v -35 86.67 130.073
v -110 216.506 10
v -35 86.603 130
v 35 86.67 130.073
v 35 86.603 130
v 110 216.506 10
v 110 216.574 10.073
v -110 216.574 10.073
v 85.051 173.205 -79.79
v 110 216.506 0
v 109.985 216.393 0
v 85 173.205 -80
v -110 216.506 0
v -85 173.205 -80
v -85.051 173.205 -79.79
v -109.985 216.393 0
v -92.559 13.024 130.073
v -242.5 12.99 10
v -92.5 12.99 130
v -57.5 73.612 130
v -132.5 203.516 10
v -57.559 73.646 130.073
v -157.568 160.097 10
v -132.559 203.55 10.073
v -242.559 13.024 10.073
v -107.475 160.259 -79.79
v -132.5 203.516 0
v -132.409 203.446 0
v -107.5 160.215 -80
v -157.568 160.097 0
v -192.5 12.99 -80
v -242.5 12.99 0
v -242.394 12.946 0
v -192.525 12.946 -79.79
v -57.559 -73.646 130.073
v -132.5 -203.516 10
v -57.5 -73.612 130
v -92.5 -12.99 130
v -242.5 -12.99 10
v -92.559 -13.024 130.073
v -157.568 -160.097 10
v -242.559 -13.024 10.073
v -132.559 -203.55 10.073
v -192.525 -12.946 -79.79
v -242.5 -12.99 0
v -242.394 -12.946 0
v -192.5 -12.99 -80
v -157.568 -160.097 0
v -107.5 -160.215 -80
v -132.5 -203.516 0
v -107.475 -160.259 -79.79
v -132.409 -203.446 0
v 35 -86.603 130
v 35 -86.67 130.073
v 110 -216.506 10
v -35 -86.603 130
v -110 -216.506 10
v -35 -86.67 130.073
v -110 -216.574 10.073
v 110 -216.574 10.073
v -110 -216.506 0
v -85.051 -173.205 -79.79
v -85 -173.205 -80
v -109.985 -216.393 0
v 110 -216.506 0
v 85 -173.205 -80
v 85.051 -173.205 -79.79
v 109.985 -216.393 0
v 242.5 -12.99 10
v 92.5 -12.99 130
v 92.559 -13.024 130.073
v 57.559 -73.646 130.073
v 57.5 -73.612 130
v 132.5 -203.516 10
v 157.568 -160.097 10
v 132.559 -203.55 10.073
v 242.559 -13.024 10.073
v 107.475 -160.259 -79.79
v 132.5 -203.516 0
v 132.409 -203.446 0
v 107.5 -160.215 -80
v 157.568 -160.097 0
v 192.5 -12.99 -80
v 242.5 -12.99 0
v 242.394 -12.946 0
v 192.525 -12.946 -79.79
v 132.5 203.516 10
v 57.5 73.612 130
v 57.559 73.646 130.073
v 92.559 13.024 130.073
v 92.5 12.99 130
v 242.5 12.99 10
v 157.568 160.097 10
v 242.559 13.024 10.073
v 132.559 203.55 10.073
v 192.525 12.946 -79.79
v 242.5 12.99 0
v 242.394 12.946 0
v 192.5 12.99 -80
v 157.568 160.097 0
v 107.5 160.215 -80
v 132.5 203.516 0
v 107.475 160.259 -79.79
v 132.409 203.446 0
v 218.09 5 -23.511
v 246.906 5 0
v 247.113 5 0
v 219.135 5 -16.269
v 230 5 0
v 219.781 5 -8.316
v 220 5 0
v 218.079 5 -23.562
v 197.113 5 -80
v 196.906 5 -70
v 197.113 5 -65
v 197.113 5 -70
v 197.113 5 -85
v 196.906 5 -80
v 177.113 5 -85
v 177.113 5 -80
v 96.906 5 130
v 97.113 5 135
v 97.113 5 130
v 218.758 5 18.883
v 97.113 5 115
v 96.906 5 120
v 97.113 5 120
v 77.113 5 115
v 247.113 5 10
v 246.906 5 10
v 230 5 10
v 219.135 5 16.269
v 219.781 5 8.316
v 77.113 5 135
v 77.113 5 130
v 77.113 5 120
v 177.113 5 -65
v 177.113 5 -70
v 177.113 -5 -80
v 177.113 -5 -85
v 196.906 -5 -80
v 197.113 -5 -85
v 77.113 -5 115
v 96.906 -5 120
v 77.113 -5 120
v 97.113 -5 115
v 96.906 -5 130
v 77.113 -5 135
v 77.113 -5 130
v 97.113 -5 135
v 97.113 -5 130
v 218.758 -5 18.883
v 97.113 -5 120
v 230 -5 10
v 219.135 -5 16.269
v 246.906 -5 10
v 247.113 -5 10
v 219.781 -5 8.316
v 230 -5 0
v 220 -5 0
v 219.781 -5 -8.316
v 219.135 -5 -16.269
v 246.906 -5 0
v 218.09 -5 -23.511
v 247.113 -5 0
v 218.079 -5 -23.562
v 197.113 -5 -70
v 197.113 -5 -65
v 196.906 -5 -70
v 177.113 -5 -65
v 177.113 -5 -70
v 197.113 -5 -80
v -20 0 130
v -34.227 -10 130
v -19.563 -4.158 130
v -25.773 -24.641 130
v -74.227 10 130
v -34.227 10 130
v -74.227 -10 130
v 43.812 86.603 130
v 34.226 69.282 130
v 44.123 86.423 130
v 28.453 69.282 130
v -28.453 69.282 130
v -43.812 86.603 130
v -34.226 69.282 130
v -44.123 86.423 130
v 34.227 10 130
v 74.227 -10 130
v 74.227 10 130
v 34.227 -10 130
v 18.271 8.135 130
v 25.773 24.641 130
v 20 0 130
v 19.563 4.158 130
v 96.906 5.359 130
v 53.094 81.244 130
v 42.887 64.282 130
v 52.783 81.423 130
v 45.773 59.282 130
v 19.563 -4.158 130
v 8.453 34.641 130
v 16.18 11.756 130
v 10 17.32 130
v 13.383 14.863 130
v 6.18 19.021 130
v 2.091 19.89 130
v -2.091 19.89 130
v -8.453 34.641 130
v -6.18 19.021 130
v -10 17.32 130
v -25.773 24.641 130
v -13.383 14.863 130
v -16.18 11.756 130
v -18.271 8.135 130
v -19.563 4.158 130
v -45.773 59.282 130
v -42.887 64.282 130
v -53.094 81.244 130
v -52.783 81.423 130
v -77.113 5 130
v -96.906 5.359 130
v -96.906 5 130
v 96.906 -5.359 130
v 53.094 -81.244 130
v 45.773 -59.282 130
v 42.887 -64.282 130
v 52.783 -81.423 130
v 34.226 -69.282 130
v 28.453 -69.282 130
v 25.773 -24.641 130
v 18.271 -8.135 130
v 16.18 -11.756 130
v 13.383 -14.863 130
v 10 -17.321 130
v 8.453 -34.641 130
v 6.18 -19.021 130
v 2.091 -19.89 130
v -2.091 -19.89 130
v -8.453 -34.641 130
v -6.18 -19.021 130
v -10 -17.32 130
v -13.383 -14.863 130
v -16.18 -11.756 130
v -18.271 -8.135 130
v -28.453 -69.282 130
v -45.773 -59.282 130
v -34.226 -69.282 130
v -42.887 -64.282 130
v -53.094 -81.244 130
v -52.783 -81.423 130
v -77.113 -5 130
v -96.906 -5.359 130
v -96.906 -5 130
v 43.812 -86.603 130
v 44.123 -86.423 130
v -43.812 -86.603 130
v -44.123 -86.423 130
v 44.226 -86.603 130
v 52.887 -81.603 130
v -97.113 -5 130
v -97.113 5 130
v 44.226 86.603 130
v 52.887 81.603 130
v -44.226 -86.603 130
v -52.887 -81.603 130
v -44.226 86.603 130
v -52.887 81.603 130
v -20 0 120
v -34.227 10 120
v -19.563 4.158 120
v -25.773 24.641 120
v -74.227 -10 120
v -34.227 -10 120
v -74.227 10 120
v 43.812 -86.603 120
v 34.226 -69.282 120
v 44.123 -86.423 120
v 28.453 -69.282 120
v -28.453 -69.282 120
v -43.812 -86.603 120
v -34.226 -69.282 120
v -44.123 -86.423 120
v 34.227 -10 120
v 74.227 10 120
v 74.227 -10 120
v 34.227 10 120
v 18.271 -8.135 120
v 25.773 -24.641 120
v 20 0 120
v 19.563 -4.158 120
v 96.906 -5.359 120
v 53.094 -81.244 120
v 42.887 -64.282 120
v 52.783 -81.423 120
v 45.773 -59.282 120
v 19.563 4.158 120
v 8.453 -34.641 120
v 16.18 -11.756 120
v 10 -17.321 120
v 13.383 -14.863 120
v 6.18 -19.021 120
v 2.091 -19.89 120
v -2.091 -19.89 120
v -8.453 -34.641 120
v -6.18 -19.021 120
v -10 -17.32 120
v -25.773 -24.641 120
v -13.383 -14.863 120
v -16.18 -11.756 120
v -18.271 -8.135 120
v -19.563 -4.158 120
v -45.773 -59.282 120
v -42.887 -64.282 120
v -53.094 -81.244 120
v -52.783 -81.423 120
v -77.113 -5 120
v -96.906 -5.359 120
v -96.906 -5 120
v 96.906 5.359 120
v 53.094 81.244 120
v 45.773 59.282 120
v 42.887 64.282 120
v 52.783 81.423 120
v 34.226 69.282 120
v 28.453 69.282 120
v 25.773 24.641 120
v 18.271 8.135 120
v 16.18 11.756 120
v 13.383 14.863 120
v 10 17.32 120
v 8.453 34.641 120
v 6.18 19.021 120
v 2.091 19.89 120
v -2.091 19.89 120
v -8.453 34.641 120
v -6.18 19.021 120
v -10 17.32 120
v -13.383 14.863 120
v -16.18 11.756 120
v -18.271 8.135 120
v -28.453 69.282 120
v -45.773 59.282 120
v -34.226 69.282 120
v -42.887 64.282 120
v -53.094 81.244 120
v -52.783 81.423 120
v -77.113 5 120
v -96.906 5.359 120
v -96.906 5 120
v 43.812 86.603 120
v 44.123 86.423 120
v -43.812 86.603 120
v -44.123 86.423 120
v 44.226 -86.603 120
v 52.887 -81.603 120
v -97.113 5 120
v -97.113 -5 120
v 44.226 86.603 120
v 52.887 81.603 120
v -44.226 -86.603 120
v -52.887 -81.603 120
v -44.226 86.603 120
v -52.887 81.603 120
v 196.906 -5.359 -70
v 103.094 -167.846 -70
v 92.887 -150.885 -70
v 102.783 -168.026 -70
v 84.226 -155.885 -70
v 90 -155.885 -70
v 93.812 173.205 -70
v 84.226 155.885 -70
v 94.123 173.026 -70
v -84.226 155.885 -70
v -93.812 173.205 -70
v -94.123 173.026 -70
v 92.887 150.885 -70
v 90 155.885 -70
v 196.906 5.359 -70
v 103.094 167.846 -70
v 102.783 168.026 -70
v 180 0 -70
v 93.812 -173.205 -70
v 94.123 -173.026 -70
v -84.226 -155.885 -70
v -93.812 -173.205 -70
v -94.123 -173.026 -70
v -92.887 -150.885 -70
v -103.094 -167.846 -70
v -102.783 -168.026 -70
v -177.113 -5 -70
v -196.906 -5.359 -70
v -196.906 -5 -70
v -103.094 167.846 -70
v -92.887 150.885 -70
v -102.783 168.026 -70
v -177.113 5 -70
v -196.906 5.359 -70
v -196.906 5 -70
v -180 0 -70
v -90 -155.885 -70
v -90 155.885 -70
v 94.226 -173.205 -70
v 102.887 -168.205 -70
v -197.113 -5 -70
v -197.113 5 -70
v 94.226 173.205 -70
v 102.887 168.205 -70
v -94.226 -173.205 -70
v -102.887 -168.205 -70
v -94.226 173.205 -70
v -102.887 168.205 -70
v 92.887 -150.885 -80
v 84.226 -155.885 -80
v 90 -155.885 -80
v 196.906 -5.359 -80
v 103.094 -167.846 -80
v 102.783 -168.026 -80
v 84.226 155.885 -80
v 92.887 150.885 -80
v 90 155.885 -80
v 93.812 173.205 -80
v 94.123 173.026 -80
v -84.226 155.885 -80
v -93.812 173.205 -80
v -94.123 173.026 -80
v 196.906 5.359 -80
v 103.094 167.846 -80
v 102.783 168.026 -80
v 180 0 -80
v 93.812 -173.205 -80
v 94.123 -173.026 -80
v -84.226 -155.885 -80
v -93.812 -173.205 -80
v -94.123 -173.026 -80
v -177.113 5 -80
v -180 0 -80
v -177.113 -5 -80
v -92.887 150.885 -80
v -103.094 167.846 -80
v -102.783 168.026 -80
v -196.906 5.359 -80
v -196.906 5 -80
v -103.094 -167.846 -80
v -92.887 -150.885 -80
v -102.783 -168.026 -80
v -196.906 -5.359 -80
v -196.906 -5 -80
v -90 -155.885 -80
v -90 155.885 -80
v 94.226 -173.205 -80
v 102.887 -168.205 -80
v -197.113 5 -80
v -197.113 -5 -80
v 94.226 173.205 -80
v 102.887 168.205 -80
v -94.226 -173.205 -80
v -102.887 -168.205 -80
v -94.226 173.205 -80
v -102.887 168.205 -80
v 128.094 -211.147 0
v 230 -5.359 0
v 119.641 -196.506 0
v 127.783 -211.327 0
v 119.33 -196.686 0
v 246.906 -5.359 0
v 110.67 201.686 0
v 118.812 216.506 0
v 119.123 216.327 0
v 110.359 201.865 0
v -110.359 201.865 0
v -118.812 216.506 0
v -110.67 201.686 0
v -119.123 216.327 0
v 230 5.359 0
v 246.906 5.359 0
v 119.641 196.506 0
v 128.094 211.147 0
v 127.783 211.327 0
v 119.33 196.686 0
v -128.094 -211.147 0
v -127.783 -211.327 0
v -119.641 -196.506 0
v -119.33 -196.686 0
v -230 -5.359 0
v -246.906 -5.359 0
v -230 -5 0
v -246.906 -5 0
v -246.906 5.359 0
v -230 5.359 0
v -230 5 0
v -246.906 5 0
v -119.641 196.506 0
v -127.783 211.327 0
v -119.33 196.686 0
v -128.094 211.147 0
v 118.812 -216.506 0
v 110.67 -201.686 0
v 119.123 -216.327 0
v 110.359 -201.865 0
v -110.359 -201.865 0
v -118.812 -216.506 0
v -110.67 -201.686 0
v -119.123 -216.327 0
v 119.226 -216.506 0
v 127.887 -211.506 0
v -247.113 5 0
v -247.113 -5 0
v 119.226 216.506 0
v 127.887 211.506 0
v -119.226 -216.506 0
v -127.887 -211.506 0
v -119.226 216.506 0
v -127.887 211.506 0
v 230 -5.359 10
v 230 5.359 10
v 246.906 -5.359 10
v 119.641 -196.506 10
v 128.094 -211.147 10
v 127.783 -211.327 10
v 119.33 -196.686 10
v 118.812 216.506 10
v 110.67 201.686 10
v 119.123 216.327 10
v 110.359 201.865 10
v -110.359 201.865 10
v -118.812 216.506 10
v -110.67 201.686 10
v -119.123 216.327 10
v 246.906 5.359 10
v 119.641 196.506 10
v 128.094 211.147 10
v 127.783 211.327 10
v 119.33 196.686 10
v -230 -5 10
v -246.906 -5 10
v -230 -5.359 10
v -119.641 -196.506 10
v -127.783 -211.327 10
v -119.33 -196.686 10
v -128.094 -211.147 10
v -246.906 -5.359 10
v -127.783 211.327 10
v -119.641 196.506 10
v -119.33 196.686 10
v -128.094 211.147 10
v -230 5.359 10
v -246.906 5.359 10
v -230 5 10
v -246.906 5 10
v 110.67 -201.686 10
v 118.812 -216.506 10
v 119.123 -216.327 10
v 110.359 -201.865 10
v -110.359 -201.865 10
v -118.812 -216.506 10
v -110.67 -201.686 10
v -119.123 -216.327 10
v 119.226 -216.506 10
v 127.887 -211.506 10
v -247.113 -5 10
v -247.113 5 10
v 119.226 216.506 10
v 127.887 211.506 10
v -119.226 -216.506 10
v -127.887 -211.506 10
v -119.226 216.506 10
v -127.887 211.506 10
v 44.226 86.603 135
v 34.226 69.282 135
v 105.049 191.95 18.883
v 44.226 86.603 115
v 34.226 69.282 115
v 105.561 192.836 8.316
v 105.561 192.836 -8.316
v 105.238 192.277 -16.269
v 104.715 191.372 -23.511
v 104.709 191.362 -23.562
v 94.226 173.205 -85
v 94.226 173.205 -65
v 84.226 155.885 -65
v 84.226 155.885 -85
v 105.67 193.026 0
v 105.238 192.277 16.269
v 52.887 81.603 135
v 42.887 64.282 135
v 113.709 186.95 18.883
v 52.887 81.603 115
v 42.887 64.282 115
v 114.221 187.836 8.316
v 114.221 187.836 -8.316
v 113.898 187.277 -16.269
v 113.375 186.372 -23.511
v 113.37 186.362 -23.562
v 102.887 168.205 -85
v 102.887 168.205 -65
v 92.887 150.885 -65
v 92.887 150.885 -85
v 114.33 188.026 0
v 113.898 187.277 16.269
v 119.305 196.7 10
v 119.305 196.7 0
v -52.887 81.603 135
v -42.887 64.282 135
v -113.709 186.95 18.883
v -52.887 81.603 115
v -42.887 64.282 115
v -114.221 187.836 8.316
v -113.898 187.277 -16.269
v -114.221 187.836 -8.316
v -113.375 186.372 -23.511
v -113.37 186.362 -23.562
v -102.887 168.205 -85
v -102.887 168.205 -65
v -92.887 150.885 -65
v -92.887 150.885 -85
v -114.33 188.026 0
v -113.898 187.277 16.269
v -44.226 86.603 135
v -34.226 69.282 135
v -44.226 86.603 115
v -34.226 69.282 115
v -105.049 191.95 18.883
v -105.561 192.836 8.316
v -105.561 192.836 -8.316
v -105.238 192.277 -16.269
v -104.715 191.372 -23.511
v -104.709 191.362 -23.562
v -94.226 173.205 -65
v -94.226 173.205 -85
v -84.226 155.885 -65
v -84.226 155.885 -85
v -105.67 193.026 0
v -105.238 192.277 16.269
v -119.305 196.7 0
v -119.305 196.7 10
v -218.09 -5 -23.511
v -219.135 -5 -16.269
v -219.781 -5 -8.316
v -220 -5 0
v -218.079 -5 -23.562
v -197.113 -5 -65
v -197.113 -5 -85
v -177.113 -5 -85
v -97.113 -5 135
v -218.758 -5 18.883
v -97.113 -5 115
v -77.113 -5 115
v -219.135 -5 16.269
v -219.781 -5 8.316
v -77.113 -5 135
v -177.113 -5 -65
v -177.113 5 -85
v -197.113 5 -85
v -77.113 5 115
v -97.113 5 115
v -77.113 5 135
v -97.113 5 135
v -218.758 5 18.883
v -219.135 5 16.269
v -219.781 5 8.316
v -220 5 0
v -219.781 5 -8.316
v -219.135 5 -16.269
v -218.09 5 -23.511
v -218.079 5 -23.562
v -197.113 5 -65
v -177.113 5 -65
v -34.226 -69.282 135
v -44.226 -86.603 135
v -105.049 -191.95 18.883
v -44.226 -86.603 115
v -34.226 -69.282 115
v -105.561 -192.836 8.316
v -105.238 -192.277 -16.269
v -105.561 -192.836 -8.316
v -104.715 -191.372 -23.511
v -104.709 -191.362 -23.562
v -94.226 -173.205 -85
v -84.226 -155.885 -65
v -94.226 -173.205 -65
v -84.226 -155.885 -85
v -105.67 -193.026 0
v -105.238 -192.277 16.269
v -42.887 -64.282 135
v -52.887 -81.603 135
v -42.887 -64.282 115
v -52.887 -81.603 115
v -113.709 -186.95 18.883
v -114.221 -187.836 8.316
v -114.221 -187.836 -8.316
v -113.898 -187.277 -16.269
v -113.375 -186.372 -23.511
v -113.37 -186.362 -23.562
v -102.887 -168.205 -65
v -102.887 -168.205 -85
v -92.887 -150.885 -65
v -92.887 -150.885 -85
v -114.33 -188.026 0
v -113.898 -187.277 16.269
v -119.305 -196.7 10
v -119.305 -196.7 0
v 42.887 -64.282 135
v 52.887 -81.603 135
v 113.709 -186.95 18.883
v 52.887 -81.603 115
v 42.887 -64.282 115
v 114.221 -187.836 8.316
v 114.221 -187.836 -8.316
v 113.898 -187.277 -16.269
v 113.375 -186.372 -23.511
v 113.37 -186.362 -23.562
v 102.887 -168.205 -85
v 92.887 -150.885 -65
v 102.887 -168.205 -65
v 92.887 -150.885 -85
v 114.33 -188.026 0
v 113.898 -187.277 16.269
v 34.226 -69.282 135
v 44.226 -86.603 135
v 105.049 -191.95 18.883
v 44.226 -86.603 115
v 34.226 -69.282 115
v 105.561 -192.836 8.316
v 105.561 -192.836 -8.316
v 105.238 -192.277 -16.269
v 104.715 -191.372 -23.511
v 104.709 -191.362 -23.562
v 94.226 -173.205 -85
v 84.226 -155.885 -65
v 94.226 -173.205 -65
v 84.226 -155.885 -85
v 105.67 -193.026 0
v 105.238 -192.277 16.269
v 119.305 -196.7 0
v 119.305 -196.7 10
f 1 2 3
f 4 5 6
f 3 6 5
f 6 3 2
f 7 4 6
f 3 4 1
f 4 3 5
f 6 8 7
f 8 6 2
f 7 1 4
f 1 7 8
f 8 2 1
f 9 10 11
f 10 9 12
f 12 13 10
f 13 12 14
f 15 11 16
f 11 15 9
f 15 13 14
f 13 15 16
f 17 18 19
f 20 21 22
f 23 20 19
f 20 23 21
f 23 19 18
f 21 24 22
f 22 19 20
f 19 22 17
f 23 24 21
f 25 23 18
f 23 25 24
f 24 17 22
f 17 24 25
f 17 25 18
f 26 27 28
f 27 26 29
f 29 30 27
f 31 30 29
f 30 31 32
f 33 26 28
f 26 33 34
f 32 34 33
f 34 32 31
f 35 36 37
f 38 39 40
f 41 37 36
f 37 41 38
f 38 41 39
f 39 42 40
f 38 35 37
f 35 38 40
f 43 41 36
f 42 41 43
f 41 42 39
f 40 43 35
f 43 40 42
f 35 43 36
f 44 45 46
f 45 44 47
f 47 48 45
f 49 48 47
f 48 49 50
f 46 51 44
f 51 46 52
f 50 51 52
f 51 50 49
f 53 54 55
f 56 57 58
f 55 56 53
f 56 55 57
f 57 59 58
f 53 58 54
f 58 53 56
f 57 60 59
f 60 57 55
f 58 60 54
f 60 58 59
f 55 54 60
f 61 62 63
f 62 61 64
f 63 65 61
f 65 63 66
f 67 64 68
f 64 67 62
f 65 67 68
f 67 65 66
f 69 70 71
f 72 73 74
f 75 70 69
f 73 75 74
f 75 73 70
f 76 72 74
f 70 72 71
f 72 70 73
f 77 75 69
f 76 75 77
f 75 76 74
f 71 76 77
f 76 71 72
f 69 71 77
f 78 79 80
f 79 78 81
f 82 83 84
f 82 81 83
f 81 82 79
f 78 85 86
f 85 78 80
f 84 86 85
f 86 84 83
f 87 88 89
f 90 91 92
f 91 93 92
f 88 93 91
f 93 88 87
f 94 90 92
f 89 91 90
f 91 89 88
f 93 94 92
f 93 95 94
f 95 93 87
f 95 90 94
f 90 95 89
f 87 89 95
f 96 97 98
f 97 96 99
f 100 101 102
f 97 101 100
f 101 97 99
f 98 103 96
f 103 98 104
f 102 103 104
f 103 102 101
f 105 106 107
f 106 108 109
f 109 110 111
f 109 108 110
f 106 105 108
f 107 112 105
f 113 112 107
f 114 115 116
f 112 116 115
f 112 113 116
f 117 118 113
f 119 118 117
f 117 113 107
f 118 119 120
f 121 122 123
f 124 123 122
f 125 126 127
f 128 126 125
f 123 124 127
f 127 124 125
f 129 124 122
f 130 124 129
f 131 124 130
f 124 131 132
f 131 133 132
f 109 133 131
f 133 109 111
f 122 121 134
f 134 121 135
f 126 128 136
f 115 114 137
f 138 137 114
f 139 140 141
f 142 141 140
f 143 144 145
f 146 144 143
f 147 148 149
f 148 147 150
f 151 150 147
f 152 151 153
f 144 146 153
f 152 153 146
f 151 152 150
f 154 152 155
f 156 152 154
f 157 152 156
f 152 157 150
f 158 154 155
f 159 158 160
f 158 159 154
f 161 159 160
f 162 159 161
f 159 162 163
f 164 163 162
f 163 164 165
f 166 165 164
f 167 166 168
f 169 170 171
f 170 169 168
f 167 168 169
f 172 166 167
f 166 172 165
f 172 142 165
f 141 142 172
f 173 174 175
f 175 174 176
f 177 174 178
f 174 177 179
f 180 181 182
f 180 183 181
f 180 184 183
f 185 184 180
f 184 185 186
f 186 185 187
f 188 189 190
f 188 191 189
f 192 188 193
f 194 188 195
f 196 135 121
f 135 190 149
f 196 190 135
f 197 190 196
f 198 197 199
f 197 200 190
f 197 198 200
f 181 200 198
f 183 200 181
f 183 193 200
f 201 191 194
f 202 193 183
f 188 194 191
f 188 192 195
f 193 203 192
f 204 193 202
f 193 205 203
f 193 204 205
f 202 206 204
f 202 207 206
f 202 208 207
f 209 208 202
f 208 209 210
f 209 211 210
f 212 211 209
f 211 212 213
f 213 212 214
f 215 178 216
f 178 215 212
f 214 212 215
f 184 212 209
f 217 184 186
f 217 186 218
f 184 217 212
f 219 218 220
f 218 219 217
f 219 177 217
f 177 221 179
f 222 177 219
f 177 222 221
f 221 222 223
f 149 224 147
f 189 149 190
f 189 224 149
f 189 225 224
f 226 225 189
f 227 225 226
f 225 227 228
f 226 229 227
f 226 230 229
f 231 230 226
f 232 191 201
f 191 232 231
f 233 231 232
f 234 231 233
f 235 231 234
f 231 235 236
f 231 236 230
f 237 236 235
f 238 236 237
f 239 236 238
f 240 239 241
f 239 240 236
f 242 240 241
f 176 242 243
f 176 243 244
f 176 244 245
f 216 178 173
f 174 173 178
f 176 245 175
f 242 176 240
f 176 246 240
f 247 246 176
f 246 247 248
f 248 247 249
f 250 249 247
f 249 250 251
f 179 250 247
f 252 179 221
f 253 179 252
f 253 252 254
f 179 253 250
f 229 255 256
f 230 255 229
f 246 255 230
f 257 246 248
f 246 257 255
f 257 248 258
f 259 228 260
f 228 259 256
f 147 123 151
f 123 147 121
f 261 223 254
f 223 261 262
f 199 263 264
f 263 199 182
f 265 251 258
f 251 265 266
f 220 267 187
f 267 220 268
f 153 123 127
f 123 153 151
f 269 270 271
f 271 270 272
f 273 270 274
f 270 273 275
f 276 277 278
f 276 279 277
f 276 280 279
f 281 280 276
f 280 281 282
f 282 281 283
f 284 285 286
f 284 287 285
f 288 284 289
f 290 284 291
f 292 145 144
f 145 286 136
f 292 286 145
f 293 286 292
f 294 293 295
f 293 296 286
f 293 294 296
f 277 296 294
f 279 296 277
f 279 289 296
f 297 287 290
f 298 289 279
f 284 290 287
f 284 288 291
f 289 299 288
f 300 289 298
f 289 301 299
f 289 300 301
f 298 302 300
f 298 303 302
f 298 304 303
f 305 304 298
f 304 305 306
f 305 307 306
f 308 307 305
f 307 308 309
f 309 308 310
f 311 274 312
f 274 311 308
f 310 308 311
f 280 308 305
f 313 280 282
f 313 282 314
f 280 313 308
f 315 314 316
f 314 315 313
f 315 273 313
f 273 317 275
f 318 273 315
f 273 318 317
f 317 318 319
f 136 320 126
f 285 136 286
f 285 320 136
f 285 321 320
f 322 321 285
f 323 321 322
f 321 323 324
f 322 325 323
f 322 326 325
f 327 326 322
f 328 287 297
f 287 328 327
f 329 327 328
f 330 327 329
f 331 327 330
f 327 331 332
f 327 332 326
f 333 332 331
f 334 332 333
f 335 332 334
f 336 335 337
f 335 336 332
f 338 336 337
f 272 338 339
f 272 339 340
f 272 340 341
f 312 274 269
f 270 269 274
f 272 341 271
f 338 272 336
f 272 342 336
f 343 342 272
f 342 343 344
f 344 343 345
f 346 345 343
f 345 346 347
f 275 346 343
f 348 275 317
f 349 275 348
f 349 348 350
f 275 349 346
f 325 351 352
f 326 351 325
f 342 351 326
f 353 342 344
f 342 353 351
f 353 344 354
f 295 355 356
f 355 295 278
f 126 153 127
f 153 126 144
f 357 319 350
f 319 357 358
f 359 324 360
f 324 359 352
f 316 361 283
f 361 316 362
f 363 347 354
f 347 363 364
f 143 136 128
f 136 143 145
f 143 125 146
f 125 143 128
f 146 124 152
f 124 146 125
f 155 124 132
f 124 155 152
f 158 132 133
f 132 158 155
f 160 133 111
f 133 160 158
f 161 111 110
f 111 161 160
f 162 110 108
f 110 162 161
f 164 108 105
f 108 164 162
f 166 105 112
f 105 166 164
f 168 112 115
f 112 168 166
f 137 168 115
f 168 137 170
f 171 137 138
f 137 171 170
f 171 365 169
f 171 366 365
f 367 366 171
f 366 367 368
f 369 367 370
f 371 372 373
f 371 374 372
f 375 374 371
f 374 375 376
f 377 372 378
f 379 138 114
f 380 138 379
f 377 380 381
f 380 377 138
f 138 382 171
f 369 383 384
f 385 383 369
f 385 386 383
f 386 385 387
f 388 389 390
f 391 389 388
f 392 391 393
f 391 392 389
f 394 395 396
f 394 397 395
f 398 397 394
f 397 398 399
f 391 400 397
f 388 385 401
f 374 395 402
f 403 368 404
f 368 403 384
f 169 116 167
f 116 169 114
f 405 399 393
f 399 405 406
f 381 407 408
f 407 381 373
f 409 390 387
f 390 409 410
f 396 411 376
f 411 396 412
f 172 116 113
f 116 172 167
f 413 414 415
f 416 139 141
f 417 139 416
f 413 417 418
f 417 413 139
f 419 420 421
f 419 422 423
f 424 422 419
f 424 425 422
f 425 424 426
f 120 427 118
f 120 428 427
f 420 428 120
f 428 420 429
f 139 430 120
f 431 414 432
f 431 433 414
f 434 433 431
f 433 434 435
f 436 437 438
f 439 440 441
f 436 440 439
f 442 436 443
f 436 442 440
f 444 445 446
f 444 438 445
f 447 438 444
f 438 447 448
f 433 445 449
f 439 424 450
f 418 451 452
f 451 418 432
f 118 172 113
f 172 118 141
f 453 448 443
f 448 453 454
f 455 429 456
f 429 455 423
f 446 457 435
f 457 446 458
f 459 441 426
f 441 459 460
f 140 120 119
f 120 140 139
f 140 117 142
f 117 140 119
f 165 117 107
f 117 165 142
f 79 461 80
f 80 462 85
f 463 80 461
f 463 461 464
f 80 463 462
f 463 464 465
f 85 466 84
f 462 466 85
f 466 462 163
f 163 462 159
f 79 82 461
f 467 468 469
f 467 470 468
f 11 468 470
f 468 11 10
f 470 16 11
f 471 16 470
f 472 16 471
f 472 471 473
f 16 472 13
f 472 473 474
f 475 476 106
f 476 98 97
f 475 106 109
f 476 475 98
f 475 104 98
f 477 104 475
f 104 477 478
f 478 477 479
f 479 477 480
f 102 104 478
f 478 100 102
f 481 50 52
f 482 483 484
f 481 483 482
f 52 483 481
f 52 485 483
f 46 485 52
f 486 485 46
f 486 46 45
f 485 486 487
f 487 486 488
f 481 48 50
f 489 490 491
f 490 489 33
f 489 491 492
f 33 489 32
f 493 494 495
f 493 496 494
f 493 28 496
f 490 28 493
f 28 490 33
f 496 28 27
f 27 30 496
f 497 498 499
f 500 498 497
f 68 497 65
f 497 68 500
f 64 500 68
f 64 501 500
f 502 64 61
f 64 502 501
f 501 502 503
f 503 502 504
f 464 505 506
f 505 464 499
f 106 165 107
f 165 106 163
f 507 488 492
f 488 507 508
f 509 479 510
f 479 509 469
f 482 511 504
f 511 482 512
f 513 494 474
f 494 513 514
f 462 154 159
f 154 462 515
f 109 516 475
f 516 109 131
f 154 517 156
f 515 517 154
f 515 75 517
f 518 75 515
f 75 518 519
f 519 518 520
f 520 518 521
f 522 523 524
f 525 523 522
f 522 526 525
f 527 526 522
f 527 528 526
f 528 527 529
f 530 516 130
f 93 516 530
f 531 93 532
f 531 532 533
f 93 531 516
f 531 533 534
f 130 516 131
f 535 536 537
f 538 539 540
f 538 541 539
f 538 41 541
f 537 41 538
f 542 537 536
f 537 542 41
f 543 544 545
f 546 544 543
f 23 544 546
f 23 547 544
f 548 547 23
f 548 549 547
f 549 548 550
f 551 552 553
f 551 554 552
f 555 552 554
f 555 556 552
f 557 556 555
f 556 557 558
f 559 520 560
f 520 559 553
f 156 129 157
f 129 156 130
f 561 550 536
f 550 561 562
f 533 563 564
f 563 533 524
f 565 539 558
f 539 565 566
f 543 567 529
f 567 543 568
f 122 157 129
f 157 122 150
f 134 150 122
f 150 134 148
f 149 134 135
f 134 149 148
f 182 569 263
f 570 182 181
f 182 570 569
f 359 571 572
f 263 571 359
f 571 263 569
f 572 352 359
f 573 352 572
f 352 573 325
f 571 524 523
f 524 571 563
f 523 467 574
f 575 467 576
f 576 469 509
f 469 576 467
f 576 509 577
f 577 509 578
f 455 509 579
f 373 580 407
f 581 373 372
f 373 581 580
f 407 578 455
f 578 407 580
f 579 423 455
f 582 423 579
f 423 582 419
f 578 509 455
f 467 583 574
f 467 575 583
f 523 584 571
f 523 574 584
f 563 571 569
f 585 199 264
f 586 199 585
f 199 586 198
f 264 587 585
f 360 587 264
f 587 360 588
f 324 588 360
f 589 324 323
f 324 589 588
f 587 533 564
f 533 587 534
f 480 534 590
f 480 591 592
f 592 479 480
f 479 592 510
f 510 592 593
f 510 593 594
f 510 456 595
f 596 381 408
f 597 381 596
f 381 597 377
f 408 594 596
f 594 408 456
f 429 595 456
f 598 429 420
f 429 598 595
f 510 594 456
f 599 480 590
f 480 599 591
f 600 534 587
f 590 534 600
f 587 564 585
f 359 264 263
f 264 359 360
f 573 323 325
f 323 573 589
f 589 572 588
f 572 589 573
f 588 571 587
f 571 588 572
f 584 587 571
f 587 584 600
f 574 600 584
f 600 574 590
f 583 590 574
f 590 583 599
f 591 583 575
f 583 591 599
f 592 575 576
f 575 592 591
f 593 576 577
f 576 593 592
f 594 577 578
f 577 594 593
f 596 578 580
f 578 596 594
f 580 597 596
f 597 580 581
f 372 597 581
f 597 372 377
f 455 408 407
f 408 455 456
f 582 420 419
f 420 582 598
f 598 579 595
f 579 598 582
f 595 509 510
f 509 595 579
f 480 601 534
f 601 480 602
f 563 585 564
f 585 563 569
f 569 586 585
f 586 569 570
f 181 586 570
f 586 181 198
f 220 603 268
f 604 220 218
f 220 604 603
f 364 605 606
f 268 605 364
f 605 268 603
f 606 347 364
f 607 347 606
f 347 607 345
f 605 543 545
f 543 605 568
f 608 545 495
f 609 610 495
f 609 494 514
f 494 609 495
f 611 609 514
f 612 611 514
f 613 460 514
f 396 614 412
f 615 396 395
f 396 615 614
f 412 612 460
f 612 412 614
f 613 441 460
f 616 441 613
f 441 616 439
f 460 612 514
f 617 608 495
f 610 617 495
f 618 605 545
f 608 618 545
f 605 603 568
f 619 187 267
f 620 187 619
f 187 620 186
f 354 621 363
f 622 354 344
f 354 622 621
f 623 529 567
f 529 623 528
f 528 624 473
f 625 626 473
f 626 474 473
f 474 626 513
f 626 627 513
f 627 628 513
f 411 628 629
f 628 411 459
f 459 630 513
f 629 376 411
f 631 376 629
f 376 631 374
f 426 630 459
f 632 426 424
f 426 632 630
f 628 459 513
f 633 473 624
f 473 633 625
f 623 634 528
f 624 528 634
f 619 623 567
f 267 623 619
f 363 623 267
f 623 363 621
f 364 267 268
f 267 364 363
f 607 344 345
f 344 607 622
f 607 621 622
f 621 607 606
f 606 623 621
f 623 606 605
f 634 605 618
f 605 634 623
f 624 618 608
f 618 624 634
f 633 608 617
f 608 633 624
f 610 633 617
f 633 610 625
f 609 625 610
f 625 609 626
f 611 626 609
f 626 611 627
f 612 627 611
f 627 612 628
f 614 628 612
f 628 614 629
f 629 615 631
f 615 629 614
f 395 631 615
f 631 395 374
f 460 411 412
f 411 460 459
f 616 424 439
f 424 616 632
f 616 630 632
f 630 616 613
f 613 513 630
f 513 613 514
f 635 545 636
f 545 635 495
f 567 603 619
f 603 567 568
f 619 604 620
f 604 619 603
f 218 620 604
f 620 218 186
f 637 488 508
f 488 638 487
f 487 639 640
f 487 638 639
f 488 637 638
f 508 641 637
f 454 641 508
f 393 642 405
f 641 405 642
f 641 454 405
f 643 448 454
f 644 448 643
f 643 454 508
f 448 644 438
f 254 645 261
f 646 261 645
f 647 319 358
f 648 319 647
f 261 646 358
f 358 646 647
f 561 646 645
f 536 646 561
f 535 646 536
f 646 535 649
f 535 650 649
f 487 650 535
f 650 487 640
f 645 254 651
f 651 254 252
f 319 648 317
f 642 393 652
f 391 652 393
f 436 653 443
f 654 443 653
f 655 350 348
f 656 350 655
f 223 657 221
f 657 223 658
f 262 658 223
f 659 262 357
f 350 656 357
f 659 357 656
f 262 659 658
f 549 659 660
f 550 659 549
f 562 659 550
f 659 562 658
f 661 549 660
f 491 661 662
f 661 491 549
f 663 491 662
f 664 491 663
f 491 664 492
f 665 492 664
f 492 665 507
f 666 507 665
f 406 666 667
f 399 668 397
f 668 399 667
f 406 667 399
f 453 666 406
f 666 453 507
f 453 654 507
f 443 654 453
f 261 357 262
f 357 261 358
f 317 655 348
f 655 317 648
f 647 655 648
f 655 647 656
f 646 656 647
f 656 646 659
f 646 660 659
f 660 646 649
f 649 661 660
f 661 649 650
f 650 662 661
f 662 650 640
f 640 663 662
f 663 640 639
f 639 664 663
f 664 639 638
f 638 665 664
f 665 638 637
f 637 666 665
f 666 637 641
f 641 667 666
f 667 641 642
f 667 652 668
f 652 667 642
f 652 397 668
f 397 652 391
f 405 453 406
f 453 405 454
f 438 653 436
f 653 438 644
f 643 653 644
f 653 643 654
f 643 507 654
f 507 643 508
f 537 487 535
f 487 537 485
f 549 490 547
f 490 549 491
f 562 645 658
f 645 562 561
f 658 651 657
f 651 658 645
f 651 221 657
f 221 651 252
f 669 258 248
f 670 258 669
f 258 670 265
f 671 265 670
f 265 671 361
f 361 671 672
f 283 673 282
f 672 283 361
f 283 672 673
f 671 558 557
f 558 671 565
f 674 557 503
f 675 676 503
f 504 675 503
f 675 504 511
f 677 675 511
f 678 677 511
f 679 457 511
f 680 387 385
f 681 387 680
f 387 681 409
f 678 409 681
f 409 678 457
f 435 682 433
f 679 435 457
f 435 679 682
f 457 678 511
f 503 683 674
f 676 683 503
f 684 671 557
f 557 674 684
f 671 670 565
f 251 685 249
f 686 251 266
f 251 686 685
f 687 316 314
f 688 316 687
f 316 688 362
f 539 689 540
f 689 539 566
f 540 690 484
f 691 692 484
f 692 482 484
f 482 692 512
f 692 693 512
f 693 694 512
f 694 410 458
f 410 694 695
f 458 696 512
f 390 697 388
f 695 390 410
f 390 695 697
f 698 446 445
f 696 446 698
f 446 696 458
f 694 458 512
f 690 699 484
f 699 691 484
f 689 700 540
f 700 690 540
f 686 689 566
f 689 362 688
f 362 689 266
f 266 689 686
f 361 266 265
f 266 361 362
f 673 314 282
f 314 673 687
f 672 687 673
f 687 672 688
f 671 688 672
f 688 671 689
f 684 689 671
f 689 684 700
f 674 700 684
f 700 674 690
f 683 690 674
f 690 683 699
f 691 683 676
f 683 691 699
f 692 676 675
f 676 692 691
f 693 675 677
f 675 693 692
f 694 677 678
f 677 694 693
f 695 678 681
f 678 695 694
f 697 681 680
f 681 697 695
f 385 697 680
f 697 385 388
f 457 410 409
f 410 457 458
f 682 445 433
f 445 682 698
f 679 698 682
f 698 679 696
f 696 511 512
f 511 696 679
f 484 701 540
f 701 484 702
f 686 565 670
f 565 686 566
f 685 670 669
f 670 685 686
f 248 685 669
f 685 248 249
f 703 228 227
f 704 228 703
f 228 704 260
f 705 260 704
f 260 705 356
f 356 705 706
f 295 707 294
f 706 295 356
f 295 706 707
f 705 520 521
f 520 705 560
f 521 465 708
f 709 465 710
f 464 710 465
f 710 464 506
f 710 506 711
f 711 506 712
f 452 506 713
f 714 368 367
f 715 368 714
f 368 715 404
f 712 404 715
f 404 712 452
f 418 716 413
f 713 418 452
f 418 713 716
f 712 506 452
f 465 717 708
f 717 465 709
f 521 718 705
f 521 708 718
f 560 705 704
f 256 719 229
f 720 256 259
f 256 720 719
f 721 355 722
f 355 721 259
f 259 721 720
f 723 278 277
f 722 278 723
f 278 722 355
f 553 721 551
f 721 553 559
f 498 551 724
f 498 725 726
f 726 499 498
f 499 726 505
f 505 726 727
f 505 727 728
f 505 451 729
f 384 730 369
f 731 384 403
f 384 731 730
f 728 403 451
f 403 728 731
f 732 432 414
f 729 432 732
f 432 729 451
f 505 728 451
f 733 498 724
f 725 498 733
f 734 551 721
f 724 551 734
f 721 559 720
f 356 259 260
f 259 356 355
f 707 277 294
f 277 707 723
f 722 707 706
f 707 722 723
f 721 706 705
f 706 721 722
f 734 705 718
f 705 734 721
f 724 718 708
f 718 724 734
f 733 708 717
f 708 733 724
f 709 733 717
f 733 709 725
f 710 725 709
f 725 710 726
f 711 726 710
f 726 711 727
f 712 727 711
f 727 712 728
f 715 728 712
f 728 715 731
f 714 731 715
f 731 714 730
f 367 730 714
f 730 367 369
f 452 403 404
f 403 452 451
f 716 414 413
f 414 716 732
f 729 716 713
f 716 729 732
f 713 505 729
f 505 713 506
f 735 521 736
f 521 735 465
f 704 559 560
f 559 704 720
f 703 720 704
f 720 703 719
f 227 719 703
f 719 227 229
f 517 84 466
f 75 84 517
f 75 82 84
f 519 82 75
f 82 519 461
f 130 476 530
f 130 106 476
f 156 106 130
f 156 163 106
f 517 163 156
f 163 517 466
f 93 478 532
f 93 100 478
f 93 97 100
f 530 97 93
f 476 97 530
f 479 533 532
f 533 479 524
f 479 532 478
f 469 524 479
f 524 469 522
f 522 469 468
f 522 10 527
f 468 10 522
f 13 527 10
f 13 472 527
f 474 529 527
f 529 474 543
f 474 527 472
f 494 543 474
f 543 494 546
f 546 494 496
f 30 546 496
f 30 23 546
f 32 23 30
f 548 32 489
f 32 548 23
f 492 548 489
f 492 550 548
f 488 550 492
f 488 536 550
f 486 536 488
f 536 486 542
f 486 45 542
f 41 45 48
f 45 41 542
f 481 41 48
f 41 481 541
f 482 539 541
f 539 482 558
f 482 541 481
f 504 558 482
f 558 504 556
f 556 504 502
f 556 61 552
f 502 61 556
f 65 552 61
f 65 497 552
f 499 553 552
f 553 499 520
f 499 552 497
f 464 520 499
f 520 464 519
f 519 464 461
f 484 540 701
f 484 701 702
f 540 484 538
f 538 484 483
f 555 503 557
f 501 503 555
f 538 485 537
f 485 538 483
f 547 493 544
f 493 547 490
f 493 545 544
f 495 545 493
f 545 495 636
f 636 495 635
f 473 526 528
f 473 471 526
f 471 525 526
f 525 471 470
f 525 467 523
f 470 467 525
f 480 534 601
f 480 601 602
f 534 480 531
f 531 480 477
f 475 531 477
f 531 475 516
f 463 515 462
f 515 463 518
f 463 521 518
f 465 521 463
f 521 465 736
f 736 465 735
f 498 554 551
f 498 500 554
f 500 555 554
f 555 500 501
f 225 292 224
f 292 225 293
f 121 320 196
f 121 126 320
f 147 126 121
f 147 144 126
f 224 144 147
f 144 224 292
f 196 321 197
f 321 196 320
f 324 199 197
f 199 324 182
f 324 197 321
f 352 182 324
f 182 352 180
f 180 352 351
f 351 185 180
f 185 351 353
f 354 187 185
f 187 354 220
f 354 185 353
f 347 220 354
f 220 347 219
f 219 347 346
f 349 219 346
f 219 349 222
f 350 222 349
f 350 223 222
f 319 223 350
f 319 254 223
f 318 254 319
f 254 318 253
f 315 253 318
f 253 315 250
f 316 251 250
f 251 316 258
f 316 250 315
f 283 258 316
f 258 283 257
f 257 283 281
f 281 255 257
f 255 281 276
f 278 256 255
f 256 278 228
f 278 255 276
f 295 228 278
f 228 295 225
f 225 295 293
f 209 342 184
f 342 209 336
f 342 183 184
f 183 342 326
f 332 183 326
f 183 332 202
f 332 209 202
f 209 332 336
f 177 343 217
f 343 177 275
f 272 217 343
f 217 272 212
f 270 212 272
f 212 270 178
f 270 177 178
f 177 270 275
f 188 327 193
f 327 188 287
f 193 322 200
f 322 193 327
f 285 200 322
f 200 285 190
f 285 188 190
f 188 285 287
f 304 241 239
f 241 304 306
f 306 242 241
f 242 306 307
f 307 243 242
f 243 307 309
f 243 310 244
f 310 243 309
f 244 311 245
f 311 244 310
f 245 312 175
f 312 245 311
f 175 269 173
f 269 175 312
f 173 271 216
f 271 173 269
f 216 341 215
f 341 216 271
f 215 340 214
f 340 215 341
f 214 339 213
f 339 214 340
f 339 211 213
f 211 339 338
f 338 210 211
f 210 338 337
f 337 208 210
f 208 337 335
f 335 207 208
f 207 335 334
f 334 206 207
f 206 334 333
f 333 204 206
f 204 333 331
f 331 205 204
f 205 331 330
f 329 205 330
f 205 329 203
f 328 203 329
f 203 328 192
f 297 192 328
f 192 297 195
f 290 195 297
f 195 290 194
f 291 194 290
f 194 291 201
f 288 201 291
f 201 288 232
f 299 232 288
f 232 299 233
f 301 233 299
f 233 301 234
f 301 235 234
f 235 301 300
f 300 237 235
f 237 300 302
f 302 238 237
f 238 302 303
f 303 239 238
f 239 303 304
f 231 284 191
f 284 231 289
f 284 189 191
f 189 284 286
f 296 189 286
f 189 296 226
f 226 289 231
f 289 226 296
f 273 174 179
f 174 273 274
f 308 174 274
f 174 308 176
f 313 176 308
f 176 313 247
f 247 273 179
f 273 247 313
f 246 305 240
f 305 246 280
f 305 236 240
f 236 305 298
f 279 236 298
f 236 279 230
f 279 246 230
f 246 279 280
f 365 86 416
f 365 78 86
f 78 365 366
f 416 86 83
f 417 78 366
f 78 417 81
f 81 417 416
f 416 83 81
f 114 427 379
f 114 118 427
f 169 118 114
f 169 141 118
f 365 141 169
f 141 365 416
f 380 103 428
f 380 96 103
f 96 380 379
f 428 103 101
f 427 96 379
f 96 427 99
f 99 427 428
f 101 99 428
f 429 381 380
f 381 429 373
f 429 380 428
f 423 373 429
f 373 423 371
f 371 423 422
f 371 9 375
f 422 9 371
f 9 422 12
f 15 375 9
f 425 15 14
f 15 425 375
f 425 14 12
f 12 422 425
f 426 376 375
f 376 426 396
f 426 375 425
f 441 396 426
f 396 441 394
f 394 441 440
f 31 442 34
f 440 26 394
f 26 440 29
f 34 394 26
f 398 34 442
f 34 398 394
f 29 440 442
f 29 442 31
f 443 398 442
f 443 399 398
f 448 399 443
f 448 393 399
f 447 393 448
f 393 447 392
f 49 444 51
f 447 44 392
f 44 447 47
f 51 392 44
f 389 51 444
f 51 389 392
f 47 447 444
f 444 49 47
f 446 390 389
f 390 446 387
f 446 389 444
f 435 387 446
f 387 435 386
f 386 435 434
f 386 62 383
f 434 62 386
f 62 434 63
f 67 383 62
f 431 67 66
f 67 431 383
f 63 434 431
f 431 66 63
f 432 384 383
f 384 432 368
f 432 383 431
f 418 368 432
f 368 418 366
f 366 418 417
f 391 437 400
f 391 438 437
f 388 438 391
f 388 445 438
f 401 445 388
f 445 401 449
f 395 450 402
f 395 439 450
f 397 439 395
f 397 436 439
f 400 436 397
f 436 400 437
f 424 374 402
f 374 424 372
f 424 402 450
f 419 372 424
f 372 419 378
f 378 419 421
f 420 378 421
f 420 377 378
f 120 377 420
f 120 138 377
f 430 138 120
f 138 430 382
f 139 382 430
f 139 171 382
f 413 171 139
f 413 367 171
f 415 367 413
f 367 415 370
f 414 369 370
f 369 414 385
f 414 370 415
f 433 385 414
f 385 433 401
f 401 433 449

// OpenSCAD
middle_radius=250;
upper_radius=100;
lower_radius=200;

middle_up = 120;
lower_middle = -80;

lamp_hole_radius=20;
plywood=10;
paper=0.1;
part_width=20;
slot_width=5;
shade_offset=15;

module hexagon(or){
polygon([for(t=[0:5]) [cos(t*60)*or,sin(t*60)*or]]);
};

module 2d_connection(){
chamfer=plywood/(2*tan(60));
union(){
// upper connection
polygon(
    [[middle_radius-chamfer,plywood],
     [middle_radius-part_width,plywood],
     [upper_radius-chamfer, middle_up-slot_width],
     [upper_radius-chamfer, middle_up+plywood+slot_width]]
);
// upper slot
translate([upper_radius-chamfer-part_width,middle_up-slot_width,0])
square([part_width,slot_width]);
translate([upper_radius-chamfer-part_width,middle_up+plywood,0])
square([part_width,slot_width]);
// lower connection
polygon(
    [[middle_radius-chamfer,0],
     [middle_radius-part_width,0],
     [lower_radius-chamfer, lower_middle+plywood+slot_width],
     [lower_radius-chamfer,lower_middle-slot_width]]
);
// lower slot
translate([lower_radius-chamfer-part_width,lower_middle-slot_width,0])
square([part_width,slot_width]);
translate([lower_radius-chamfer-part_width,lower_middle+plywood,0])
square([part_width,slot_width]);
// middle slot
translate([middle_radius-part_width-plywood,0,0]) square([plywood,1.5*plywood]);
translate([middle_radius-part_width-plywood,0,0])
difference(){
scale([1,2.5,1]) circle(r=plywood);    
translate([-plywood, 0,0])scale([1,4,1]) circle(r=plywood);
};
};
};

// connection
module connection(){    
rotate([90,0,0])
linear_extrude(plywood, center=true) 2d_connection();
};

// shades
module shade(shade_offset=20){
m_segment_y = sqrt(pow(middle_radius,2)-pow(middle_radius/2,2));
u_segment_y = sqrt(pow(upper_radius,2)-pow(upper_radius/2,2));
l_segment_y = sqrt(pow(lower_radius,2)-pow(lower_radius/2,2));
length_shade = sqrt(pow(m_segment_y-u_segment_y,2)+pow(middle_up,2));
length_lower_shade = sqrt(pow(m_segment_y-l_segment_y,2)+pow(lower_middle,2));
angle_shade = atan((middle_up)/(m_segment_y-u_segment_y));
angle_lower_shade = atan((lower_middle)/(m_segment_y-l_segment_y));

translate([0,m_segment_y,plywood])
rotate([-angle_shade,0,0])
linear_extrude(paper)
polygon(
    [[middle_radius/2-shade_offset, 0],
     [-middle_radius/2+shade_offset, 0],
     [-upper_radius/2+shade_offset, -length_shade],
     [upper_radius/2-shade_offset, -length_shade]]
);

translate([0,m_segment_y,0])
rotate([-angle_lower_shade,0,0])
linear_extrude(paper)
polygon(
    [[middle_radius/2-shade_offset, 0],
     [-middle_radius/2+shade_offset, 0],
     [-lower_radius/2+shade_offset, -length_lower_shade],
     [lower_radius/2-shade_offset, -length_lower_shade]]
);
};

module lamp(){
union(){
//middle
linear_extrude(plywood)
difference(){
    offset(delta=2*plywood,chamfer=true)offset(delta=-2*plywood)
    hexagon(or=middle_radius);
//    offset(delta=part_width, chamfer=true)offset(delta=-2*part_width)hexagon(or=middle_radius);
    offset(delta=2*plywood, chamfer=true)
    hexagon(or=middle_radius-part_width-2*plywood);
};

// up
translate([0,0,middle_up])
linear_extrude(plywood)
union(){
difference(){
    offset(delta=2*plywood,chamfer=true)offset(delta=-2*plywood)
    hexagon(or=upper_radius);
    hexagon(or=upper_radius-part_width);
};
difference(){
    hexagon(or=lamp_hole_radius+part_width);
    circle(lamp_hole_radius);
};
for(i=[0:5]) rotate([0,0,i*60])
translate([(upper_radius-lamp_hole_radius-part_width)/2+lamp_hole_radius,0,0])
square([upper_radius-lamp_hole_radius-part_width, part_width], center=true);

};

//lower
translate([0,0,lower_middle])
linear_extrude(plywood)
difference(){
    offset(delta=2*plywood,chamfer=true)offset(delta=-2*plywood)
    hexagon(or=lower_radius);
    hexagon(or=lower_radius-part_width);
};

for(i=[0:5]){
    rotate([0,0,i*60]) connection();
    rotate([0,0,i*60]) shade(shade_offset=shade_offset);
};
};
};

lamp();
